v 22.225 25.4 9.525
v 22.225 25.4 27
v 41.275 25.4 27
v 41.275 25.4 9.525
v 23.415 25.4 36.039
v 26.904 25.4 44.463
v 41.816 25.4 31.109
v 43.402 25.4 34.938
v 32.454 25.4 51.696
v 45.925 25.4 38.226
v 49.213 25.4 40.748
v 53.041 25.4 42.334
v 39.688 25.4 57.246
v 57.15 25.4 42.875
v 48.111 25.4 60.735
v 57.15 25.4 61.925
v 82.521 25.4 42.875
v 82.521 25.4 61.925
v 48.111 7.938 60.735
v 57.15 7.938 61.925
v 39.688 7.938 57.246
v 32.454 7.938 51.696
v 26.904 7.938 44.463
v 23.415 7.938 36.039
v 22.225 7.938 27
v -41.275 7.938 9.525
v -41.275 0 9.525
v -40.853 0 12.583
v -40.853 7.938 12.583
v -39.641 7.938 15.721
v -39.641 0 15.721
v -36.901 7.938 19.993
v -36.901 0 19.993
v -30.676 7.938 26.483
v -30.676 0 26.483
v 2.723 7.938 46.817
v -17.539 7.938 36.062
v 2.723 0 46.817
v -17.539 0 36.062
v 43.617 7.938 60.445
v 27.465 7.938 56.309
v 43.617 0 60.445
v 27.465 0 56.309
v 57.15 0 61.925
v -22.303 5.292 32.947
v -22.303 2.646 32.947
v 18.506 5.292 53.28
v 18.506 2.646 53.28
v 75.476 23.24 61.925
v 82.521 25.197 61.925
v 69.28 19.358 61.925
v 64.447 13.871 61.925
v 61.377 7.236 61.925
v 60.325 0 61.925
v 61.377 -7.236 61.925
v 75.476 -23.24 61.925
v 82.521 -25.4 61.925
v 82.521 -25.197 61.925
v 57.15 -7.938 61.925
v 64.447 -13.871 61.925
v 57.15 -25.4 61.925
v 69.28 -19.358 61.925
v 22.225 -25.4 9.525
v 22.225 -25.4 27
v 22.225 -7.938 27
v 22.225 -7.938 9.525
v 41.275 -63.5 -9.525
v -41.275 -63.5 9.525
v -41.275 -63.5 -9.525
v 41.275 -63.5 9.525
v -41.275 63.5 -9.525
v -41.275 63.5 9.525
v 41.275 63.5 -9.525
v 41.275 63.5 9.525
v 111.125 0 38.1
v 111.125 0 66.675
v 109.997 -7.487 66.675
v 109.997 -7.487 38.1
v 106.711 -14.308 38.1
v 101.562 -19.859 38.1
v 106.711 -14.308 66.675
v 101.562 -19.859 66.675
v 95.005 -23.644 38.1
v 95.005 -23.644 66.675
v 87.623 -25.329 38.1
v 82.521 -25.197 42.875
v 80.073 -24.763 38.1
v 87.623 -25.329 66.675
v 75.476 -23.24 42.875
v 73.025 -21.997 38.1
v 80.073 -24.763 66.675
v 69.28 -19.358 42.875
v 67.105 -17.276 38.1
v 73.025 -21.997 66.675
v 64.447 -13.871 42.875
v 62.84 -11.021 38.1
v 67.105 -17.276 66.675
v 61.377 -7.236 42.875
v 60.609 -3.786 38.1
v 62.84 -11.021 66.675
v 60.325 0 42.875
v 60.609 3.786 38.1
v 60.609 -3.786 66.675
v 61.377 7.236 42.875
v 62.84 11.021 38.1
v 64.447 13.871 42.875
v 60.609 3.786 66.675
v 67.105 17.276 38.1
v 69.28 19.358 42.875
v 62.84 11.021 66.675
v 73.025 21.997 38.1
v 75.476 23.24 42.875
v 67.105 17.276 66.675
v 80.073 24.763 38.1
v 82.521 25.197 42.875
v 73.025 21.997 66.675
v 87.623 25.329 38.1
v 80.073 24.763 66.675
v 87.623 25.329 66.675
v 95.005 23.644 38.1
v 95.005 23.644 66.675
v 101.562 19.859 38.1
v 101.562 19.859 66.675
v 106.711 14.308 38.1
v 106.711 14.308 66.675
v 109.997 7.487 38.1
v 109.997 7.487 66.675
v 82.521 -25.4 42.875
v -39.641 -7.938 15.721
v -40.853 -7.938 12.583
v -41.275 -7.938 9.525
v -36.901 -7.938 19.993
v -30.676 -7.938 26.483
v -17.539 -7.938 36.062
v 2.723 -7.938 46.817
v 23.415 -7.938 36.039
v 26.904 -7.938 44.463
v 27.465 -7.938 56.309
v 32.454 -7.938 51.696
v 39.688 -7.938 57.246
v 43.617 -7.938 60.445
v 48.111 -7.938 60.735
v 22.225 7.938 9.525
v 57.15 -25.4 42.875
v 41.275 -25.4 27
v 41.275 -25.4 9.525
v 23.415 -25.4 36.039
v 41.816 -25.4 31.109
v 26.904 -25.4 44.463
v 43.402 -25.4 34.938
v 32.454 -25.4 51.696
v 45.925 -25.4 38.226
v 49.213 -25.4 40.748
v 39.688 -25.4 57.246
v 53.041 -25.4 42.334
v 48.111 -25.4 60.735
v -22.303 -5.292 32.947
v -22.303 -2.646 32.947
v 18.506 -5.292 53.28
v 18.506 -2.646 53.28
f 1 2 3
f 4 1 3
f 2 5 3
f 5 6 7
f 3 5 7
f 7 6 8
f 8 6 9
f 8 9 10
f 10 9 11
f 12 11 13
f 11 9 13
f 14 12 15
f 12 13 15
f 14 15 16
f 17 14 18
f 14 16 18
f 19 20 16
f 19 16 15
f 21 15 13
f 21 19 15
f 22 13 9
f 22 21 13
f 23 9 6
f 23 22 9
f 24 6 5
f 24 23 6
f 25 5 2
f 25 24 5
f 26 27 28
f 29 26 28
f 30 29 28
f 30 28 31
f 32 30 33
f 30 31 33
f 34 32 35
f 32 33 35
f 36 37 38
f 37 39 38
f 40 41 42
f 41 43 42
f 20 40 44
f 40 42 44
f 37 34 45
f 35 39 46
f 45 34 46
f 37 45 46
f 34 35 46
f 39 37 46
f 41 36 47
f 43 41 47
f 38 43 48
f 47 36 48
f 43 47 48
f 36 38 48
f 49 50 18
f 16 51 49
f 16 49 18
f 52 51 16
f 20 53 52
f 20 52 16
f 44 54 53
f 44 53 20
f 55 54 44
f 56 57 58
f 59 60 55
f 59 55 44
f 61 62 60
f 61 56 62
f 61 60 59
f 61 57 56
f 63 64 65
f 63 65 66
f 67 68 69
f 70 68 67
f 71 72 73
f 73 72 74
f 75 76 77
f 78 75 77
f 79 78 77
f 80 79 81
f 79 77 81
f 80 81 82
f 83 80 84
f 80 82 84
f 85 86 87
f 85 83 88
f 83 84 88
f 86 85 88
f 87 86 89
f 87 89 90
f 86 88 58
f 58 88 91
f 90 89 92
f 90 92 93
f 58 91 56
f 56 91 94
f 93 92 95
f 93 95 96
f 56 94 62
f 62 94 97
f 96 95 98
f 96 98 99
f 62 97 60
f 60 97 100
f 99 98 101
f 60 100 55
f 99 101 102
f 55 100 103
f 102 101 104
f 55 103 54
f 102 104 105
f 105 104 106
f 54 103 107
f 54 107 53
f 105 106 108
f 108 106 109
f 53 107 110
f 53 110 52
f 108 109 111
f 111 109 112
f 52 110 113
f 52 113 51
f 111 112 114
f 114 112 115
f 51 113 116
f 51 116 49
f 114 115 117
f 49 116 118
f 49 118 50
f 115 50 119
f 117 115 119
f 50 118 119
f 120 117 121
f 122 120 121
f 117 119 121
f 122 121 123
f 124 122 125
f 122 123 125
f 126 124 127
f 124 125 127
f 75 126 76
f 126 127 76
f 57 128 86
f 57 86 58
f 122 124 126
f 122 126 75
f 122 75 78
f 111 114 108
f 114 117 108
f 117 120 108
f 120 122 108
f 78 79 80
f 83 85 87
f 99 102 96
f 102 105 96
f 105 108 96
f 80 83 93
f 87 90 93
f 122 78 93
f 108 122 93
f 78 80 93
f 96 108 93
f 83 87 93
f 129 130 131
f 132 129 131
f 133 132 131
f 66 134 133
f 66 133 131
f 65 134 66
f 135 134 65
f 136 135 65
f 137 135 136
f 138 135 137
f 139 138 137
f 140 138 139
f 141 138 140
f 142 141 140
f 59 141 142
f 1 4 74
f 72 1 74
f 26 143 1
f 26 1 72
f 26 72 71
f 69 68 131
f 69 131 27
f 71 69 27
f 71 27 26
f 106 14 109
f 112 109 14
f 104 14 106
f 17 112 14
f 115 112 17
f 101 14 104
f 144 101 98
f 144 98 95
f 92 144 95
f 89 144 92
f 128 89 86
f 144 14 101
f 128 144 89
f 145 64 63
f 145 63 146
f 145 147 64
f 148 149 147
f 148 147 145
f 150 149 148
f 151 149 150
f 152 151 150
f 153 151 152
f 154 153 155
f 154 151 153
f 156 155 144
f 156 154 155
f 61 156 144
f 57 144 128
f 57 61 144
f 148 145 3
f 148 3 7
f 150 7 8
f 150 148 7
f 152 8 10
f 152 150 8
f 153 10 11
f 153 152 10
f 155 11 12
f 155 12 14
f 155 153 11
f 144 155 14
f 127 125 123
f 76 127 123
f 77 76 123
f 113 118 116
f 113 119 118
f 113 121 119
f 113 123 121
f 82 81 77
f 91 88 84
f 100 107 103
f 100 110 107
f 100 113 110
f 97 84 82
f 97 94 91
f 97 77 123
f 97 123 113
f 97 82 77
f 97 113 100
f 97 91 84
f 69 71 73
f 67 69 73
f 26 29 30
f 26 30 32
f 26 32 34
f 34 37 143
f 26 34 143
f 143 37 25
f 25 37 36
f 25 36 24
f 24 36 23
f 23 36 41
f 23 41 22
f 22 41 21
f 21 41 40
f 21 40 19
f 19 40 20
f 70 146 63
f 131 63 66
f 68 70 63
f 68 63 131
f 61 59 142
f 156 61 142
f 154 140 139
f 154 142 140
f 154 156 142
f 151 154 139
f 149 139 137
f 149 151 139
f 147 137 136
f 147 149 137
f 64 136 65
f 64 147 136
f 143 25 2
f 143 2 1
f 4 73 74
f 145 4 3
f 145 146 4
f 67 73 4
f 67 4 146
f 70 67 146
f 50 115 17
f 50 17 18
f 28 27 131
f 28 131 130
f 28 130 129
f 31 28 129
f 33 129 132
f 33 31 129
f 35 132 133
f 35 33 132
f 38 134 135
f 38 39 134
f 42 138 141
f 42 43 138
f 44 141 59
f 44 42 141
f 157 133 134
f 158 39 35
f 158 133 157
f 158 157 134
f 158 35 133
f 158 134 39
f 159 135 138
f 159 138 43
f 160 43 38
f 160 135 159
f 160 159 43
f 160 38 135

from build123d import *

# Parameters (mm, degrees)
F1_DEPTH = 63.5
F0_W     = 22.195993
F0_H     = 19.05
F2_DEPTH = 25.4
F3_DEPTH = 7.9375
F0_W_2   = 25.4
F0_H_2   = 28.575


with BuildPart() as f1:
    # F0 (on Front) → F1 (new body, symmetric)
    with BuildSketch(Plane.XZ):
        Polygon((41.275, -9.525), (41.275, 9.525), (22.225, 9.525), (-41.275, 9.525), (-41.275, -9.525), align=None)
    extrude(amount=F1_DEPTH, both=True)

    # F0 (on Front) → F2 (join, symmetric)
    with BuildSketch(Plane.XZ):
        with BuildLine():
            Line((22.225, 9.525), (41.275, 9.525))
            Line((41.275, 9.525), (41.275, 27.0002))
            ThreePointArc((41.275, 27.0002), (45.92468, 38.22552), (57.15, 42.8752))
            Line((57.15, 42.8752), (60.325, 42.8752))
            Line((60.325, 42.8752), (60.325, 61.9252))
            Line((60.325, 61.9252), (57.15, 61.9252))
            ThreePointArc((57.15, 61.9252), (32.454296, 51.695904), (22.225, 27.0002))
            Line((22.225, 27.0002), (22.225, 9.525))
        make_face()
        with Locations((71.422996, 52.4002)):
            Rectangle(F0_W, F0_H)
    extrude(amount=F2_DEPTH, both=True)

    # F0 (on Front) → F3 (join, symmetric)
    with BuildSketch(Plane.XZ):
        with BuildLine():
            Line((-41.275, 9.525), (22.225, 9.525))
            Line((22.225, 9.525), (22.225, 27.0002))
            ThreePointArc((22.225, 27.0002), (32.454296, 51.695904), (57.15, 61.9252))
            add(Edge.make_bspline(
                [(-41.275, 9.525), (-41.22147, 31.626377), (27.588112, 61.989266), (57.15, 61.9252)],
                knots=[0, 0, 0, 0, 111.504536, 111.504536, 111.504536, 111.504536], degree=3))
        make_face()
    extrude(amount=F3_DEPTH, both=True)

    # F0 (on Front) → F4 (revolve)
    with BuildSketch(Plane.XZ):
        with Locations((98.425, 52.3875)):
            Rectangle(F0_W_2, F0_H_2)
    revolve(axis=Axis((85.725, 0, 52.3875), (0, 0, -1)))


solid = f1.part
